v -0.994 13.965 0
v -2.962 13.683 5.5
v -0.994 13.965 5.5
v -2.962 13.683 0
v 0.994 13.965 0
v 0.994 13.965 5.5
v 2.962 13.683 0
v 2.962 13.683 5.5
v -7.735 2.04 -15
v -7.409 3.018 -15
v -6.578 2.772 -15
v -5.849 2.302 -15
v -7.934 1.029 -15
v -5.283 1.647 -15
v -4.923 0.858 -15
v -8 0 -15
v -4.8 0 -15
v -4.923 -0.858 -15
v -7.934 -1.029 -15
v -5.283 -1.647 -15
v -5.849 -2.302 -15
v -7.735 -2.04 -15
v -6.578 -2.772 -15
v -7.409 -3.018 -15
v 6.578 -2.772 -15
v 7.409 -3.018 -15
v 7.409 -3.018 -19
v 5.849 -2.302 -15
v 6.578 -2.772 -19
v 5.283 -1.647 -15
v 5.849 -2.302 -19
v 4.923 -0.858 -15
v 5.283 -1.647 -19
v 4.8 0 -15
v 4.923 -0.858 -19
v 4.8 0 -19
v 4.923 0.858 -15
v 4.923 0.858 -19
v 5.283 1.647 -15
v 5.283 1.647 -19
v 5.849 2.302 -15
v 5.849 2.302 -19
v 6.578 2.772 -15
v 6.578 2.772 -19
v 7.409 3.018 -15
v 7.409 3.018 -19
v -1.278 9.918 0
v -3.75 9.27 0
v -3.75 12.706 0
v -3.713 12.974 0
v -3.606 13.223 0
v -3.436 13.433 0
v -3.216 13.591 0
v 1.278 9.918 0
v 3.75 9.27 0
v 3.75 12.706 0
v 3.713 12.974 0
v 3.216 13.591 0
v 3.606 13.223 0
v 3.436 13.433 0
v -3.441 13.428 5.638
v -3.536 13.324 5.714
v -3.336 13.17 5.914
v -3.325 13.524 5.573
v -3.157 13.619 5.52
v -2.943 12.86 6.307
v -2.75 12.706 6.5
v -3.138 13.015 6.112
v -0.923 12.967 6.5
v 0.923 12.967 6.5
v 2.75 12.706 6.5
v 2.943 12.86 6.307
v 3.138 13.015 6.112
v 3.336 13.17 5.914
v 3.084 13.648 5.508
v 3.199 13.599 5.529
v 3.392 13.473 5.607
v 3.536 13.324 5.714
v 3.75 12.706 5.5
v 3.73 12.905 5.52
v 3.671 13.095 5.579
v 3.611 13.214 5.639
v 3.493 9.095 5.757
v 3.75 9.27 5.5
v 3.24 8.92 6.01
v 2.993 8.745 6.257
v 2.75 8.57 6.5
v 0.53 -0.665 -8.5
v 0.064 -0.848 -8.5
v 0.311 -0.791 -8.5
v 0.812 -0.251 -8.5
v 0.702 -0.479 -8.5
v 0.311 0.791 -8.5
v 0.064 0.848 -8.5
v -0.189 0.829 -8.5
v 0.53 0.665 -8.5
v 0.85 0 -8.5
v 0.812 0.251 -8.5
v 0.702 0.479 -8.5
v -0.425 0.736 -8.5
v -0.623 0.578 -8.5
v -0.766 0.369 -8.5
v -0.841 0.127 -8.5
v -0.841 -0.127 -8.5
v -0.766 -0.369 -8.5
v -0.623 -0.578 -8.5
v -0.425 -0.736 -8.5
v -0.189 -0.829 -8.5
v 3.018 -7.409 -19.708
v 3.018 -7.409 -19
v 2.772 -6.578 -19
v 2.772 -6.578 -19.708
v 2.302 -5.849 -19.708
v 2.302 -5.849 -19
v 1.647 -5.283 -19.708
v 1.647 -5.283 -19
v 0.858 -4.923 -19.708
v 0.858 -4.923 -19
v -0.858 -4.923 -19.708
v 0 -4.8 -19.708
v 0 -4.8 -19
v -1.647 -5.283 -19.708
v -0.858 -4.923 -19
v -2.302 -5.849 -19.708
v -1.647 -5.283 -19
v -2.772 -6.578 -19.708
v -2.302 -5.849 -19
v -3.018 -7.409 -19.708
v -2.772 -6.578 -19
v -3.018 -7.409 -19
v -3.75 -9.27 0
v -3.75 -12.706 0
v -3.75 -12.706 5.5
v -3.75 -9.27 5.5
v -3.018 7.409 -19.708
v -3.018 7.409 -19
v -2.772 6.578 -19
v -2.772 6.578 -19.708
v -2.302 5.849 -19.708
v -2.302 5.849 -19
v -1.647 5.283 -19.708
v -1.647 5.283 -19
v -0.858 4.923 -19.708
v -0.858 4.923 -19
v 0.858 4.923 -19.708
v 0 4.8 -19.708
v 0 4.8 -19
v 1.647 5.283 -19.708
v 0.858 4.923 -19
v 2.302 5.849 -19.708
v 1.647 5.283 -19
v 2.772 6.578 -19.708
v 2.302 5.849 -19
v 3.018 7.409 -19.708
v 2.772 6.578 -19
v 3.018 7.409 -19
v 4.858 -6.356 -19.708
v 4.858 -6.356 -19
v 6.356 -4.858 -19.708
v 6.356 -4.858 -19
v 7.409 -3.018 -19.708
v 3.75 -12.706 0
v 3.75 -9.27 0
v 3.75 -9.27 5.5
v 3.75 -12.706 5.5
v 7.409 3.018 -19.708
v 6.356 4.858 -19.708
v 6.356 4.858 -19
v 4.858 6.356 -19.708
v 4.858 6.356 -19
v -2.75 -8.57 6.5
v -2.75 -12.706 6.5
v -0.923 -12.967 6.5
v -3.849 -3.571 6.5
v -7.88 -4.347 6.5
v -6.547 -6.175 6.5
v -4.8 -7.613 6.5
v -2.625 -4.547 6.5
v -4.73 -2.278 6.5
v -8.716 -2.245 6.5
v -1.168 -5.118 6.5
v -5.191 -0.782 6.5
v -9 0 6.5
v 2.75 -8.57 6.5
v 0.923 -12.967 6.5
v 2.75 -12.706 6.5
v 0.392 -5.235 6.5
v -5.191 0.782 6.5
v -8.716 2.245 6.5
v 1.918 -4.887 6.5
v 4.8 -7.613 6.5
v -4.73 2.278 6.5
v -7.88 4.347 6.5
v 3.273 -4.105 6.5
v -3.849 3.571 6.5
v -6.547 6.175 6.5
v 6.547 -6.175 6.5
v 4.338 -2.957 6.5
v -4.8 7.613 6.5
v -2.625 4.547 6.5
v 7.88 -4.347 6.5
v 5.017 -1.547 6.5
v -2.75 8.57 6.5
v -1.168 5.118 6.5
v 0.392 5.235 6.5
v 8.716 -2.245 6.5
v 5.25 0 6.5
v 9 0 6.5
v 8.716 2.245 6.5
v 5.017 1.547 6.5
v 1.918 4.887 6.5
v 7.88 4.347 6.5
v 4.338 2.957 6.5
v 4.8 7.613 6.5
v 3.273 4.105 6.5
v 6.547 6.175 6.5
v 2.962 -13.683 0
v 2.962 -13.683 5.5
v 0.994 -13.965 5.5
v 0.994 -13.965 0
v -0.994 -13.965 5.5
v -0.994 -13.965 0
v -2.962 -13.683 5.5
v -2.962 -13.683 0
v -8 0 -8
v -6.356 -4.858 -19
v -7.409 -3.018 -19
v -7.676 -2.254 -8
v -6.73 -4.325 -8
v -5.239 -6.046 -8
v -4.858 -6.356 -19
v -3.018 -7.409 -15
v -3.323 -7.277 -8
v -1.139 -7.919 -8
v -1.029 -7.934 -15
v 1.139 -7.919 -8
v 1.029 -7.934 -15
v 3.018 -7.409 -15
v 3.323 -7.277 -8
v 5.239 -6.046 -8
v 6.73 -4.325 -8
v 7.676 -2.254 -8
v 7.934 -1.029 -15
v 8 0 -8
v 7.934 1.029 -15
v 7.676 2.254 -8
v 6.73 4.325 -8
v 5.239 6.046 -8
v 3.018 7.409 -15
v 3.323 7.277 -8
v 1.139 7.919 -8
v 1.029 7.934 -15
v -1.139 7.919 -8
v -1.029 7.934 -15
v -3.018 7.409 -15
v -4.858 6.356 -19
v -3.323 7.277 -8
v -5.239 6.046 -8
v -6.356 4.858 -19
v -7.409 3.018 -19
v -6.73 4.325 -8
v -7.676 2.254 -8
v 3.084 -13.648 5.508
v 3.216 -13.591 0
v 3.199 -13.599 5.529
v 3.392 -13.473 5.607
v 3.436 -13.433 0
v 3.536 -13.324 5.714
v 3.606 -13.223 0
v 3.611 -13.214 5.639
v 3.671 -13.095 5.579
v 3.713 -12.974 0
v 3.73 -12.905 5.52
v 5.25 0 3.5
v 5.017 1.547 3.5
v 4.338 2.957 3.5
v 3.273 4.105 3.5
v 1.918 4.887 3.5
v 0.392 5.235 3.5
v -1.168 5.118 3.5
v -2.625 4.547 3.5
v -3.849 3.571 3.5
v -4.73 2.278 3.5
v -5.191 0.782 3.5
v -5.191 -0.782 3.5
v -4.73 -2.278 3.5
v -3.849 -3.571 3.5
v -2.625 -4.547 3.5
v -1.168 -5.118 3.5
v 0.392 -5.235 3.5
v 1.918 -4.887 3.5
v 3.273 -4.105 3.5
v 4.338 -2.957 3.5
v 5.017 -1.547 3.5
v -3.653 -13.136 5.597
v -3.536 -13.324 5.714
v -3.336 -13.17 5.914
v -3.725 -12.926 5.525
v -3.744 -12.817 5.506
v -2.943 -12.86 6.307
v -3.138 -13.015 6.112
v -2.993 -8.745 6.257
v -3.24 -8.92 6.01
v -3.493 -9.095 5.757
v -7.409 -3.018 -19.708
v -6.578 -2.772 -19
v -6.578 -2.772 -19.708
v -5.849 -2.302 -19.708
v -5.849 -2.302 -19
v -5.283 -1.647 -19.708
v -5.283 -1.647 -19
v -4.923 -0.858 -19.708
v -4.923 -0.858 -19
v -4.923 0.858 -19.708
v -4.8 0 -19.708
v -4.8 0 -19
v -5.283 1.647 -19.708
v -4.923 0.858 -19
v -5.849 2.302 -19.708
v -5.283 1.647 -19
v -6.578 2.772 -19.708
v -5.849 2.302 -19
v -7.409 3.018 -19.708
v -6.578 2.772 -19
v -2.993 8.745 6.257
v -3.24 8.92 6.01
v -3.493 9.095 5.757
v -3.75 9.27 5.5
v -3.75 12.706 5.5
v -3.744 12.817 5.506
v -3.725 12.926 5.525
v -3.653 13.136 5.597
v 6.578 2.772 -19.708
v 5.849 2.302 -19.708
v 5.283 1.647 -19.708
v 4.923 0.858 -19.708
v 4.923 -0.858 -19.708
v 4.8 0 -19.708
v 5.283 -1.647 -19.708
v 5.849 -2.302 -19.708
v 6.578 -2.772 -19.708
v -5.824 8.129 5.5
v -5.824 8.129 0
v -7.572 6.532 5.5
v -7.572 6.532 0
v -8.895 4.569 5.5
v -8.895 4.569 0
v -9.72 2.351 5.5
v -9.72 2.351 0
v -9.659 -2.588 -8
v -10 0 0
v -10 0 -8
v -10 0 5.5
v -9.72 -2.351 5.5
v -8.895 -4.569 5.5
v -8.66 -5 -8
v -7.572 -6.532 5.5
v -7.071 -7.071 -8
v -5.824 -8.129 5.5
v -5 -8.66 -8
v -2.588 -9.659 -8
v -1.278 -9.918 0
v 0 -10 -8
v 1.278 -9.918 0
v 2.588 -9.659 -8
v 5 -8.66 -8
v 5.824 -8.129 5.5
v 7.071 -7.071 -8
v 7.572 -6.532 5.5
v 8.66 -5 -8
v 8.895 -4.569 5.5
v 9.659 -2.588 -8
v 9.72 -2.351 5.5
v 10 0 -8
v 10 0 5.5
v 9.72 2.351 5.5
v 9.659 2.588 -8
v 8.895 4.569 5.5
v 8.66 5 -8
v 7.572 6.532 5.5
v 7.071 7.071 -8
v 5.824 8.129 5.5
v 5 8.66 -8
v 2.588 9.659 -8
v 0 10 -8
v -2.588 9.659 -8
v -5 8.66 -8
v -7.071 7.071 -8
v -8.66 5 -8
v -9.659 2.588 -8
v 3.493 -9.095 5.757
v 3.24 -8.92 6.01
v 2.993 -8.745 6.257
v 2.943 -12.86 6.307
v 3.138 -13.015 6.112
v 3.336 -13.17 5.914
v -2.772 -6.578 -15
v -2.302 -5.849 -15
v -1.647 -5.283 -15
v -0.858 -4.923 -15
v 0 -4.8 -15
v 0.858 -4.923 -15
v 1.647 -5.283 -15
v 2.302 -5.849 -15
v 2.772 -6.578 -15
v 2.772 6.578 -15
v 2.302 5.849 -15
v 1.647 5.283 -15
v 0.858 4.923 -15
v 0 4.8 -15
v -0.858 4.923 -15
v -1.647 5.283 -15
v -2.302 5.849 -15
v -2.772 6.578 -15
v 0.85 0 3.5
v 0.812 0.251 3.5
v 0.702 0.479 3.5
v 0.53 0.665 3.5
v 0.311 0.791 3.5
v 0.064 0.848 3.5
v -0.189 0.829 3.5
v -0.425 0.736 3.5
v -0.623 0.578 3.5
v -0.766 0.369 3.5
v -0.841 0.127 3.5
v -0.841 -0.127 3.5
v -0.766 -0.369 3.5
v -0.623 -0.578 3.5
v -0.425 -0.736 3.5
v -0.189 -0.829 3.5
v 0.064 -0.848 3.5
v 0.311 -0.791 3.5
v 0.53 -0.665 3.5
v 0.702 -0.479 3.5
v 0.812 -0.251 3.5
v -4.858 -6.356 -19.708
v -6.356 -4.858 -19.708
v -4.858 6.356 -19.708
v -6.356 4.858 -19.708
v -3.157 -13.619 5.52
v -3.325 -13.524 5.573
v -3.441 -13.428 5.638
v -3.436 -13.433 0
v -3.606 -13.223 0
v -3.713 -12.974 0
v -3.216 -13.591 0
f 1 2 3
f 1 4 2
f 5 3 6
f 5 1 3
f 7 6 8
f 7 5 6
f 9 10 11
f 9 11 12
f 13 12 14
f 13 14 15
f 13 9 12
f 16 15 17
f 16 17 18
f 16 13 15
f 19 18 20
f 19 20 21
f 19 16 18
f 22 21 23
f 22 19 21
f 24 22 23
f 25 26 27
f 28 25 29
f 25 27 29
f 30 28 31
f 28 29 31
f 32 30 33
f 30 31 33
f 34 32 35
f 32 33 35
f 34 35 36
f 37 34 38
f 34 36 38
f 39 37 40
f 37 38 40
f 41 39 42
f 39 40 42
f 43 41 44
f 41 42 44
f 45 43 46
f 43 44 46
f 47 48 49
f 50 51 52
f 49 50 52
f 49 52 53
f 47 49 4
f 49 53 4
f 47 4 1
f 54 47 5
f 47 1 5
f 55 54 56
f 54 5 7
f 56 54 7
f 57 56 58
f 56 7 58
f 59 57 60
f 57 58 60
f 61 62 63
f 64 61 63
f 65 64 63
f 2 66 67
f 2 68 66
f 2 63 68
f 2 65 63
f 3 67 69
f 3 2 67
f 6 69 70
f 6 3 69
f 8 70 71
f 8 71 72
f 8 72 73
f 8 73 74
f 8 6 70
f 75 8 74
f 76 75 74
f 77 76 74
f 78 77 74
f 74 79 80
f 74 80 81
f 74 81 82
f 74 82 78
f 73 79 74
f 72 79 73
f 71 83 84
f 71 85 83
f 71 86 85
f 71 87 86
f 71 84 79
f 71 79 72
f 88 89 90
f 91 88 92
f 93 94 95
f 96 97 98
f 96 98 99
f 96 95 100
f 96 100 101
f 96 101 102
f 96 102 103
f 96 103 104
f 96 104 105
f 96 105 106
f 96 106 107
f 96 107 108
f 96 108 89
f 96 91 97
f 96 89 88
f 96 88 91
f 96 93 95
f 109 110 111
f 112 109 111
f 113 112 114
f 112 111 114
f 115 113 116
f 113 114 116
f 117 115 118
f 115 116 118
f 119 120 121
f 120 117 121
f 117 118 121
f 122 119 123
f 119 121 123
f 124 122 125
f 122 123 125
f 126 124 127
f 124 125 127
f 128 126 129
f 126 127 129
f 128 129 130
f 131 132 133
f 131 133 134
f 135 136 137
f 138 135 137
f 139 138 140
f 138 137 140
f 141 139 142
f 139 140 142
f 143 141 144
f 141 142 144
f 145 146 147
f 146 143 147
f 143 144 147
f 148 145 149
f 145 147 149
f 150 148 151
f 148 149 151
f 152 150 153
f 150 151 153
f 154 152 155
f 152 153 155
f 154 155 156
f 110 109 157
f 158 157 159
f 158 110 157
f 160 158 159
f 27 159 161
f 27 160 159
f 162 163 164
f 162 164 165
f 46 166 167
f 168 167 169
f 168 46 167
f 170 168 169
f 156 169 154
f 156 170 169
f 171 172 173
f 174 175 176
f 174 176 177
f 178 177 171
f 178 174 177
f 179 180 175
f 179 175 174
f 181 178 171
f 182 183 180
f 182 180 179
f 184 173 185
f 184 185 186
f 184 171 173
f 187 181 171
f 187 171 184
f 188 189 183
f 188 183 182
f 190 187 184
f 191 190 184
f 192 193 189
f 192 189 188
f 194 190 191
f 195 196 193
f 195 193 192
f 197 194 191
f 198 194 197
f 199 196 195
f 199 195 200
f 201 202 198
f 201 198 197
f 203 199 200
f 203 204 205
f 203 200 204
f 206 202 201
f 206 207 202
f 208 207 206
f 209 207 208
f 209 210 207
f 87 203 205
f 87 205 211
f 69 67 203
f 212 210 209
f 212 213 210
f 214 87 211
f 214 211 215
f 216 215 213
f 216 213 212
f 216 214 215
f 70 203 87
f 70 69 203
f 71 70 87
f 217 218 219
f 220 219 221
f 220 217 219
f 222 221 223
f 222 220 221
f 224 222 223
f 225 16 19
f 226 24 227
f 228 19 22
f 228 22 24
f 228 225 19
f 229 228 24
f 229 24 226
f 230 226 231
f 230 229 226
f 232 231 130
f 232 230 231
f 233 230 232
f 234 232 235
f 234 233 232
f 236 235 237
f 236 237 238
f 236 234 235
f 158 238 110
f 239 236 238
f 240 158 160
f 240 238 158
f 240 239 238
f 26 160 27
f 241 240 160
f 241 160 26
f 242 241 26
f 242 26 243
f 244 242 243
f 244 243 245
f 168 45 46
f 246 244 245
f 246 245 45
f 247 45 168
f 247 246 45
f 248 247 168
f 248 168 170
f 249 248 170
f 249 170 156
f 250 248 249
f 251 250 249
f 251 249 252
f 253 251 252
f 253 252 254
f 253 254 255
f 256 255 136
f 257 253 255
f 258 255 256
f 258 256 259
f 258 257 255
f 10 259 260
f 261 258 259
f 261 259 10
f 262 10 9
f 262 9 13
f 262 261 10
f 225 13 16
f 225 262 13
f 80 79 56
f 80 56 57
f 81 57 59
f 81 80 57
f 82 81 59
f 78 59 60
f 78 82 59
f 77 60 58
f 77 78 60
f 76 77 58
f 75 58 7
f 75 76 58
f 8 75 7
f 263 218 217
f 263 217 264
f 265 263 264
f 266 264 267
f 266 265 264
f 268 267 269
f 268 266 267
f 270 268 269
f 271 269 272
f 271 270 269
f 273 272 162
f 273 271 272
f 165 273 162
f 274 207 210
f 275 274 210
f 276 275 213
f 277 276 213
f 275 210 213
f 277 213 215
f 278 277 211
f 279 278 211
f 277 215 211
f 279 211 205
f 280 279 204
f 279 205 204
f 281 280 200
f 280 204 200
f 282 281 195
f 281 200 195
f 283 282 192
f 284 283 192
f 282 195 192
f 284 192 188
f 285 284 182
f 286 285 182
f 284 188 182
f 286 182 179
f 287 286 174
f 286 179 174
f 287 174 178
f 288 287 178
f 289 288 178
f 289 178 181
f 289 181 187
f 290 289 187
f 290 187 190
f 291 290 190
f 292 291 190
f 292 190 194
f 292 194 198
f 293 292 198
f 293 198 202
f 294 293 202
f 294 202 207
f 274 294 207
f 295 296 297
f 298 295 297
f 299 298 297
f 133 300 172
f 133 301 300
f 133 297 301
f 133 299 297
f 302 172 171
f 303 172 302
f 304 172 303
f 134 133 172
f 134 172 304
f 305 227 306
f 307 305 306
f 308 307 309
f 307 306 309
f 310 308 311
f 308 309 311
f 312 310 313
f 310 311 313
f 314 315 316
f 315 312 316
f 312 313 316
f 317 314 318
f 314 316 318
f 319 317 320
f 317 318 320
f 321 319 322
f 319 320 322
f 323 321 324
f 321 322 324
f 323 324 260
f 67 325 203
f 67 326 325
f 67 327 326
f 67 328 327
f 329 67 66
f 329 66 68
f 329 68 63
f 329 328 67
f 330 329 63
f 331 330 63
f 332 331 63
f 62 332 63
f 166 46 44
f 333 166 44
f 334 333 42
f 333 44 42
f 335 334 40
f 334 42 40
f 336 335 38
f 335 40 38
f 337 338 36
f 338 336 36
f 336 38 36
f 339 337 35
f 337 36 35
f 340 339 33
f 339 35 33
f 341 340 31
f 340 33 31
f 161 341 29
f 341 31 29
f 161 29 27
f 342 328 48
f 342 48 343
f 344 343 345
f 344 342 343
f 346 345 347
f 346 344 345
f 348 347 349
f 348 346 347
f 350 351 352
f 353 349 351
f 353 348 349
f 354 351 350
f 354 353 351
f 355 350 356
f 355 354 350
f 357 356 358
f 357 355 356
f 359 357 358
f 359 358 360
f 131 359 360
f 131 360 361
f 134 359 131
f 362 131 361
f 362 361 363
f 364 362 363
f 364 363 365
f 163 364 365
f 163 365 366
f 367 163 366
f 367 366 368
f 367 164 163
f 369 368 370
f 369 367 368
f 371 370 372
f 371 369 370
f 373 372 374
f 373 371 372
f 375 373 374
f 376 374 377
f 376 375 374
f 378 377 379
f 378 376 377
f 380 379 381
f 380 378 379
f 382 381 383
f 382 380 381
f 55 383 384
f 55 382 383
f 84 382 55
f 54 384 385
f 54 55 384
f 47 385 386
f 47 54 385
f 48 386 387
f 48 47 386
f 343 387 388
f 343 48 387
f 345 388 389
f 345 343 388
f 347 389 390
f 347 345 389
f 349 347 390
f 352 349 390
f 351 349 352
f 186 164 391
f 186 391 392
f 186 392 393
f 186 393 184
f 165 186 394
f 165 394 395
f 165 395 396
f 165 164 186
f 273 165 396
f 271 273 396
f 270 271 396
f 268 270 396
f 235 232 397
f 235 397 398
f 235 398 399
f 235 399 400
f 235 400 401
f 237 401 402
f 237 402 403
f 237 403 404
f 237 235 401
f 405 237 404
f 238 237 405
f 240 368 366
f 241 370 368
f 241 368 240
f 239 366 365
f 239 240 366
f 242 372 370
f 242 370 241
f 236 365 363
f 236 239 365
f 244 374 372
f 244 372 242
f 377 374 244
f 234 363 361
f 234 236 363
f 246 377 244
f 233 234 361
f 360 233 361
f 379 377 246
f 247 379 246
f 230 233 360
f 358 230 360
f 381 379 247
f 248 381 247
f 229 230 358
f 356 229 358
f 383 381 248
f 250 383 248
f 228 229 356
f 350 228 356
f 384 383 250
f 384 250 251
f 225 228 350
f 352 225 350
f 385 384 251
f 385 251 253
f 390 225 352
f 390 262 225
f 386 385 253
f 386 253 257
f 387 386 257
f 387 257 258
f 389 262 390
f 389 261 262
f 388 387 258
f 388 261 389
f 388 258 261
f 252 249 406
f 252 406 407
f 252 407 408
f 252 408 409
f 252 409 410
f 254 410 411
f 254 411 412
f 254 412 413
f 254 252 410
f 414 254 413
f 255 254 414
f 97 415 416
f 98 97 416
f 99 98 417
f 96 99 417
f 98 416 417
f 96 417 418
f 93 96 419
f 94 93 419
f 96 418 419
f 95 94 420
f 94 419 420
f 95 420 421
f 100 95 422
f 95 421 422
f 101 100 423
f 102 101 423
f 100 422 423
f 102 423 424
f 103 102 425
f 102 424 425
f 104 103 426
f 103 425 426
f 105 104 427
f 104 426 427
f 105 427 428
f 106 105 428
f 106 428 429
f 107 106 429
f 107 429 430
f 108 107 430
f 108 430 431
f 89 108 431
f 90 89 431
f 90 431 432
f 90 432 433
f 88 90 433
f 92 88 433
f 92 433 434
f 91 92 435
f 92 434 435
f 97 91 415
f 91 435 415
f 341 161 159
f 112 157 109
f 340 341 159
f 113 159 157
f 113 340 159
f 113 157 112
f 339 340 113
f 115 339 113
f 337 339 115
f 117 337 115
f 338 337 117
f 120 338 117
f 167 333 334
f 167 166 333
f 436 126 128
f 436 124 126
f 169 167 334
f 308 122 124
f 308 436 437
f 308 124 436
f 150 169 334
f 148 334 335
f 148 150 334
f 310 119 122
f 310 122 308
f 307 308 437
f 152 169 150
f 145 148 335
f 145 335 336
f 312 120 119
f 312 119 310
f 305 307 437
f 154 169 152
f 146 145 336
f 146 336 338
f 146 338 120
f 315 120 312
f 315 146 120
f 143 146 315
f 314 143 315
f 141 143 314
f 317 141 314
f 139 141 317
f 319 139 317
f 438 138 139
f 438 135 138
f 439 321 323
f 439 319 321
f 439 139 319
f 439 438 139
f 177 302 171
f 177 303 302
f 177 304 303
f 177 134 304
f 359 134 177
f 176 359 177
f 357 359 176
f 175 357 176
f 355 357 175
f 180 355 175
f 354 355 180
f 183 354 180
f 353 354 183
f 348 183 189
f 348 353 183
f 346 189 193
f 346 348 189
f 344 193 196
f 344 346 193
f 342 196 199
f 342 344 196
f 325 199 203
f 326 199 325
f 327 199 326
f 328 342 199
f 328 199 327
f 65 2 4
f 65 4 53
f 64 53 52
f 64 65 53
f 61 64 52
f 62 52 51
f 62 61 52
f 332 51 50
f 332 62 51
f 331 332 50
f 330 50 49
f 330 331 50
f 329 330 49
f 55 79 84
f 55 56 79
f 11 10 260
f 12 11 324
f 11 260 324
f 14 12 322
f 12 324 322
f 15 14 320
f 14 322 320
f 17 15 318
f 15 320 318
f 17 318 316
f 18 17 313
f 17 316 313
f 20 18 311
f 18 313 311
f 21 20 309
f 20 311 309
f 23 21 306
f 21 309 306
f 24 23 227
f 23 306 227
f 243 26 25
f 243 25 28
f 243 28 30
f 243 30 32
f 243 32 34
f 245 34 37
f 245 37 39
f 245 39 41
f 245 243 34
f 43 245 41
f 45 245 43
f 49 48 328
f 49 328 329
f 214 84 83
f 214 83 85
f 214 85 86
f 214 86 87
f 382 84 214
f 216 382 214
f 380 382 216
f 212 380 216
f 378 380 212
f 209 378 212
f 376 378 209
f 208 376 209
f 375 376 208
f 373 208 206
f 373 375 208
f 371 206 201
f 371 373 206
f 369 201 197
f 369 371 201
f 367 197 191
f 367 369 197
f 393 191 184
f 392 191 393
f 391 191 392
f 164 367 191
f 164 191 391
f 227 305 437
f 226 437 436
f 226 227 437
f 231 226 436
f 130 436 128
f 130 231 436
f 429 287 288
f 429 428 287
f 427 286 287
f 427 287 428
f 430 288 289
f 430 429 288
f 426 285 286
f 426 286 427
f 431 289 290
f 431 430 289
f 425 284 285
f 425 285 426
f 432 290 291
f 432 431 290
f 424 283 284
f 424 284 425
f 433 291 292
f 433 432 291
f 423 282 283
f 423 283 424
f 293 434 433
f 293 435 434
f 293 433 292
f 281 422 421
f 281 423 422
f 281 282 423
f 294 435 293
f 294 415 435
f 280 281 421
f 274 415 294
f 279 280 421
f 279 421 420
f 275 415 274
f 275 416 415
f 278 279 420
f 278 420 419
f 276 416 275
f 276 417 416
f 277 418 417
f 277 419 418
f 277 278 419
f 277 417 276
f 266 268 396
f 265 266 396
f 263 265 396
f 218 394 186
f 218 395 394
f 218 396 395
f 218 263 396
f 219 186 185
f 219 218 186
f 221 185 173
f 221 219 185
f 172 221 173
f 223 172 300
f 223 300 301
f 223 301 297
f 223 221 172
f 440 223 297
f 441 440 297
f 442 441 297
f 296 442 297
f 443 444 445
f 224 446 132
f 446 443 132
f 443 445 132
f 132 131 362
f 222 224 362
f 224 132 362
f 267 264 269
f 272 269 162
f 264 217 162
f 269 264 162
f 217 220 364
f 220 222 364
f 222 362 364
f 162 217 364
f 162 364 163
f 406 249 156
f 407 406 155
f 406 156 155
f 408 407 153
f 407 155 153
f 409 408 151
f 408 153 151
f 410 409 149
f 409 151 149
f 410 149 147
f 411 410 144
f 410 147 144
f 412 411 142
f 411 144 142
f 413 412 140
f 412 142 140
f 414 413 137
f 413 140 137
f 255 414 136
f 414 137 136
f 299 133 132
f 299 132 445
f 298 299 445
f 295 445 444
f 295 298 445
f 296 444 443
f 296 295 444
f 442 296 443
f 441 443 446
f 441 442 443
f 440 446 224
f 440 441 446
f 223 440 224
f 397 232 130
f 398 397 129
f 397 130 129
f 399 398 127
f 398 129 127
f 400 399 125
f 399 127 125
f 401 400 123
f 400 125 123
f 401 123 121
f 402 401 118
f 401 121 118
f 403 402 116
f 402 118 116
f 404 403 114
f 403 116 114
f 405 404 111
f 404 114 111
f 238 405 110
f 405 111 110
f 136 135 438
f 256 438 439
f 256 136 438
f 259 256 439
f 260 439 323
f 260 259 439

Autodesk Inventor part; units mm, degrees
ref_plane "YZ Plane" through (0, 0, 0) normal (1, 0, 0) x (0, 1, 0)
ref_plane "XZ Plane" through (0, 0, 0) normal (0, 1, 0) x (-1, 0, 0)
ref_plane "XY Plane" through (0, 0, 0) normal (0, 0, 1) x (1, 0, 0)
sketch "スケッチ1" plane through (0, 0, 0) normal (0, 0, 1) x (1, 0, 0)
  circle A0 centre (0, 0) radius 10
  dimension "d0" = 20
extrude "押し出し1" add sketch "スケッチ1" along normal blind 6.5
sketch "スケッチ2" plane through (0, 0, 0) normal (0, 0, -1) x (-1, 0, 0)
  arc A0 (3.75, 13.4884) -> (-3.75, 13.4884) centre (0, 0) ccw
  arc A1 (-3.75, -13.4884) -> (3.75, -13.4884) centre (0, 0) ccw
  circle A2 centre (0, 0) radius 10 projected
  line L0 (-3.75, 13.4884) -> (-3.75, -13.4884)
  line L1 (3.75, -13.4884) -> (3.75, 13.4884)
  line L2 (0, -19.6) -> (0, 19.6) projected
  line L3 (14, 0) -> (-14, 0) projected
  point P0 (0, 14)
  point P1 (0, -14)
  point P2 (-3.75, 0)
  dimension "d3" = 14
  dimension "d4" = 7.5
extrude "押し出し2" add sketch "スケッチ2" against normal up to surface (6.5 mm away) contours L1 A2 L2 A0 | L2 A2 L0 A0 | L1 L3 L2 A2 | L2 L3 L0 A2 | L1 A2 L2 L3 | L2 A2 L0 L3 | L1 A1 L2 A2 | L2 A1 L0 A2
chamfer "面取り1" distance 1 angle 45 8 edges at (-10, 0, 6.5) (10, 0, 6.5) (-3.75, 11.3793, 6.5) (0, 14, 6.5) (3.75, 11.3793, 6.5) (3.75, -11.3793, 6.5) (0, -14, 6.5) (-3.75, -11.3793, 6.5)
fillet "フィレット1" radius 1 4 edges at (-3.75, -13.4884, 2.75) (3.75, -13.4884, 2.75) (3.75, 13.4884, 2.75) (-3.75, 13.4884, 2.75)
sketch "スケッチ4" plane through (0, 0, 0) normal (0, 0, -1) x (-1, 0, 0)
  circle A0 centre (0, 0) radius 8
  dimension "d14" = 16
extrude "押し出し4" add sketch "スケッチ4" along normal blind 19
sketch "スケッチ5" plane through (0, 0, 6.5) normal (0, 0, 1) x (1, 0, 0)
  circle A0 centre (0, 0) radius 5.25
  dimension "d17" = 10.5
extrude "押し出し5" cut sketch "スケッチ5" against normal blind 3
sketch "スケッチ6" plane through (0, 0, -19) normal (0, 0, -1) x (-1, 0, 0)
  circle A0 centre (0, 7.85) radius 3.05
  line L0 (14, 0) -> (-14, 0) projected
  line L1 (0, -19.6) -> (0, 19.6) projected
  point P0 (0, 0)
  dimension "d20" = 6.1
  dimension "d21" = 7.85
extrude "押し出し6" cut sketch "スケッチ6" against normal blind 4
pattern_circular "円形状パターン1" count 4 over 360 about axis through (0, 0, -10) along (0, 0, 1) of "押し出し6"
sketch "スケッチ7" plane through (0, 0, 0) normal (0, 0, -1) x (-1, 0, 0)
  circle A0 centre (0, 0) radius 5.25 projected
  circle A1 centre (0, 0) radius 10
  point P0 (-3.75, -9.2702)
extrude "押し出し7" add sketch "スケッチ7" along normal blind 8
sketch "スケッチ8" plane through (0, 0, -19) normal (0, 0, -1) x (-1, 0, 0)
  arc A0 (-7.4089, -3.0179) -> (-7.4089, 3.0179) centre (-7.85, 0) ccw projected
  arc A1 (-7.4089, -3.0179) -> (-3.0179, -7.4089) centre (0, 0) ccw projected
  arc A2 (3.0179, -7.4089) -> (-3.0179, -7.4089) centre (0, -7.85) ccw projected
  arc A3 (3.0179, -7.4089) -> (7.4089, -3.0179) centre (0, 0) ccw projected
  arc A4 (7.4089, 3.0179) -> (7.4089, -3.0179) centre (7.85, 0) ccw projected
  arc A5 (7.4089, 3.0179) -> (3.0179, 7.4089) centre (0, 0) ccw projected
  arc A6 (-3.0179, 7.4089) -> (3.0179, 7.4089) centre (0, 7.85) ccw projected
  arc A7 (-3.0179, 7.4089) -> (-7.4089, 3.0179) centre (0, 0) ccw projected
extrude "押し出し8" add sketch "スケッチ8" along normal blind 0.708
sketch "スケッチ9" plane through (0, 0, 3.5) normal (0, 0, 1) x (1, 0, 0)
  circle A0 centre (0, 0) radius 0.85
  dimension "d31" = 1.7
extrude "押し出し9" cut sketch "スケッチ9" against normal blind 12
properties part number "conecter"
